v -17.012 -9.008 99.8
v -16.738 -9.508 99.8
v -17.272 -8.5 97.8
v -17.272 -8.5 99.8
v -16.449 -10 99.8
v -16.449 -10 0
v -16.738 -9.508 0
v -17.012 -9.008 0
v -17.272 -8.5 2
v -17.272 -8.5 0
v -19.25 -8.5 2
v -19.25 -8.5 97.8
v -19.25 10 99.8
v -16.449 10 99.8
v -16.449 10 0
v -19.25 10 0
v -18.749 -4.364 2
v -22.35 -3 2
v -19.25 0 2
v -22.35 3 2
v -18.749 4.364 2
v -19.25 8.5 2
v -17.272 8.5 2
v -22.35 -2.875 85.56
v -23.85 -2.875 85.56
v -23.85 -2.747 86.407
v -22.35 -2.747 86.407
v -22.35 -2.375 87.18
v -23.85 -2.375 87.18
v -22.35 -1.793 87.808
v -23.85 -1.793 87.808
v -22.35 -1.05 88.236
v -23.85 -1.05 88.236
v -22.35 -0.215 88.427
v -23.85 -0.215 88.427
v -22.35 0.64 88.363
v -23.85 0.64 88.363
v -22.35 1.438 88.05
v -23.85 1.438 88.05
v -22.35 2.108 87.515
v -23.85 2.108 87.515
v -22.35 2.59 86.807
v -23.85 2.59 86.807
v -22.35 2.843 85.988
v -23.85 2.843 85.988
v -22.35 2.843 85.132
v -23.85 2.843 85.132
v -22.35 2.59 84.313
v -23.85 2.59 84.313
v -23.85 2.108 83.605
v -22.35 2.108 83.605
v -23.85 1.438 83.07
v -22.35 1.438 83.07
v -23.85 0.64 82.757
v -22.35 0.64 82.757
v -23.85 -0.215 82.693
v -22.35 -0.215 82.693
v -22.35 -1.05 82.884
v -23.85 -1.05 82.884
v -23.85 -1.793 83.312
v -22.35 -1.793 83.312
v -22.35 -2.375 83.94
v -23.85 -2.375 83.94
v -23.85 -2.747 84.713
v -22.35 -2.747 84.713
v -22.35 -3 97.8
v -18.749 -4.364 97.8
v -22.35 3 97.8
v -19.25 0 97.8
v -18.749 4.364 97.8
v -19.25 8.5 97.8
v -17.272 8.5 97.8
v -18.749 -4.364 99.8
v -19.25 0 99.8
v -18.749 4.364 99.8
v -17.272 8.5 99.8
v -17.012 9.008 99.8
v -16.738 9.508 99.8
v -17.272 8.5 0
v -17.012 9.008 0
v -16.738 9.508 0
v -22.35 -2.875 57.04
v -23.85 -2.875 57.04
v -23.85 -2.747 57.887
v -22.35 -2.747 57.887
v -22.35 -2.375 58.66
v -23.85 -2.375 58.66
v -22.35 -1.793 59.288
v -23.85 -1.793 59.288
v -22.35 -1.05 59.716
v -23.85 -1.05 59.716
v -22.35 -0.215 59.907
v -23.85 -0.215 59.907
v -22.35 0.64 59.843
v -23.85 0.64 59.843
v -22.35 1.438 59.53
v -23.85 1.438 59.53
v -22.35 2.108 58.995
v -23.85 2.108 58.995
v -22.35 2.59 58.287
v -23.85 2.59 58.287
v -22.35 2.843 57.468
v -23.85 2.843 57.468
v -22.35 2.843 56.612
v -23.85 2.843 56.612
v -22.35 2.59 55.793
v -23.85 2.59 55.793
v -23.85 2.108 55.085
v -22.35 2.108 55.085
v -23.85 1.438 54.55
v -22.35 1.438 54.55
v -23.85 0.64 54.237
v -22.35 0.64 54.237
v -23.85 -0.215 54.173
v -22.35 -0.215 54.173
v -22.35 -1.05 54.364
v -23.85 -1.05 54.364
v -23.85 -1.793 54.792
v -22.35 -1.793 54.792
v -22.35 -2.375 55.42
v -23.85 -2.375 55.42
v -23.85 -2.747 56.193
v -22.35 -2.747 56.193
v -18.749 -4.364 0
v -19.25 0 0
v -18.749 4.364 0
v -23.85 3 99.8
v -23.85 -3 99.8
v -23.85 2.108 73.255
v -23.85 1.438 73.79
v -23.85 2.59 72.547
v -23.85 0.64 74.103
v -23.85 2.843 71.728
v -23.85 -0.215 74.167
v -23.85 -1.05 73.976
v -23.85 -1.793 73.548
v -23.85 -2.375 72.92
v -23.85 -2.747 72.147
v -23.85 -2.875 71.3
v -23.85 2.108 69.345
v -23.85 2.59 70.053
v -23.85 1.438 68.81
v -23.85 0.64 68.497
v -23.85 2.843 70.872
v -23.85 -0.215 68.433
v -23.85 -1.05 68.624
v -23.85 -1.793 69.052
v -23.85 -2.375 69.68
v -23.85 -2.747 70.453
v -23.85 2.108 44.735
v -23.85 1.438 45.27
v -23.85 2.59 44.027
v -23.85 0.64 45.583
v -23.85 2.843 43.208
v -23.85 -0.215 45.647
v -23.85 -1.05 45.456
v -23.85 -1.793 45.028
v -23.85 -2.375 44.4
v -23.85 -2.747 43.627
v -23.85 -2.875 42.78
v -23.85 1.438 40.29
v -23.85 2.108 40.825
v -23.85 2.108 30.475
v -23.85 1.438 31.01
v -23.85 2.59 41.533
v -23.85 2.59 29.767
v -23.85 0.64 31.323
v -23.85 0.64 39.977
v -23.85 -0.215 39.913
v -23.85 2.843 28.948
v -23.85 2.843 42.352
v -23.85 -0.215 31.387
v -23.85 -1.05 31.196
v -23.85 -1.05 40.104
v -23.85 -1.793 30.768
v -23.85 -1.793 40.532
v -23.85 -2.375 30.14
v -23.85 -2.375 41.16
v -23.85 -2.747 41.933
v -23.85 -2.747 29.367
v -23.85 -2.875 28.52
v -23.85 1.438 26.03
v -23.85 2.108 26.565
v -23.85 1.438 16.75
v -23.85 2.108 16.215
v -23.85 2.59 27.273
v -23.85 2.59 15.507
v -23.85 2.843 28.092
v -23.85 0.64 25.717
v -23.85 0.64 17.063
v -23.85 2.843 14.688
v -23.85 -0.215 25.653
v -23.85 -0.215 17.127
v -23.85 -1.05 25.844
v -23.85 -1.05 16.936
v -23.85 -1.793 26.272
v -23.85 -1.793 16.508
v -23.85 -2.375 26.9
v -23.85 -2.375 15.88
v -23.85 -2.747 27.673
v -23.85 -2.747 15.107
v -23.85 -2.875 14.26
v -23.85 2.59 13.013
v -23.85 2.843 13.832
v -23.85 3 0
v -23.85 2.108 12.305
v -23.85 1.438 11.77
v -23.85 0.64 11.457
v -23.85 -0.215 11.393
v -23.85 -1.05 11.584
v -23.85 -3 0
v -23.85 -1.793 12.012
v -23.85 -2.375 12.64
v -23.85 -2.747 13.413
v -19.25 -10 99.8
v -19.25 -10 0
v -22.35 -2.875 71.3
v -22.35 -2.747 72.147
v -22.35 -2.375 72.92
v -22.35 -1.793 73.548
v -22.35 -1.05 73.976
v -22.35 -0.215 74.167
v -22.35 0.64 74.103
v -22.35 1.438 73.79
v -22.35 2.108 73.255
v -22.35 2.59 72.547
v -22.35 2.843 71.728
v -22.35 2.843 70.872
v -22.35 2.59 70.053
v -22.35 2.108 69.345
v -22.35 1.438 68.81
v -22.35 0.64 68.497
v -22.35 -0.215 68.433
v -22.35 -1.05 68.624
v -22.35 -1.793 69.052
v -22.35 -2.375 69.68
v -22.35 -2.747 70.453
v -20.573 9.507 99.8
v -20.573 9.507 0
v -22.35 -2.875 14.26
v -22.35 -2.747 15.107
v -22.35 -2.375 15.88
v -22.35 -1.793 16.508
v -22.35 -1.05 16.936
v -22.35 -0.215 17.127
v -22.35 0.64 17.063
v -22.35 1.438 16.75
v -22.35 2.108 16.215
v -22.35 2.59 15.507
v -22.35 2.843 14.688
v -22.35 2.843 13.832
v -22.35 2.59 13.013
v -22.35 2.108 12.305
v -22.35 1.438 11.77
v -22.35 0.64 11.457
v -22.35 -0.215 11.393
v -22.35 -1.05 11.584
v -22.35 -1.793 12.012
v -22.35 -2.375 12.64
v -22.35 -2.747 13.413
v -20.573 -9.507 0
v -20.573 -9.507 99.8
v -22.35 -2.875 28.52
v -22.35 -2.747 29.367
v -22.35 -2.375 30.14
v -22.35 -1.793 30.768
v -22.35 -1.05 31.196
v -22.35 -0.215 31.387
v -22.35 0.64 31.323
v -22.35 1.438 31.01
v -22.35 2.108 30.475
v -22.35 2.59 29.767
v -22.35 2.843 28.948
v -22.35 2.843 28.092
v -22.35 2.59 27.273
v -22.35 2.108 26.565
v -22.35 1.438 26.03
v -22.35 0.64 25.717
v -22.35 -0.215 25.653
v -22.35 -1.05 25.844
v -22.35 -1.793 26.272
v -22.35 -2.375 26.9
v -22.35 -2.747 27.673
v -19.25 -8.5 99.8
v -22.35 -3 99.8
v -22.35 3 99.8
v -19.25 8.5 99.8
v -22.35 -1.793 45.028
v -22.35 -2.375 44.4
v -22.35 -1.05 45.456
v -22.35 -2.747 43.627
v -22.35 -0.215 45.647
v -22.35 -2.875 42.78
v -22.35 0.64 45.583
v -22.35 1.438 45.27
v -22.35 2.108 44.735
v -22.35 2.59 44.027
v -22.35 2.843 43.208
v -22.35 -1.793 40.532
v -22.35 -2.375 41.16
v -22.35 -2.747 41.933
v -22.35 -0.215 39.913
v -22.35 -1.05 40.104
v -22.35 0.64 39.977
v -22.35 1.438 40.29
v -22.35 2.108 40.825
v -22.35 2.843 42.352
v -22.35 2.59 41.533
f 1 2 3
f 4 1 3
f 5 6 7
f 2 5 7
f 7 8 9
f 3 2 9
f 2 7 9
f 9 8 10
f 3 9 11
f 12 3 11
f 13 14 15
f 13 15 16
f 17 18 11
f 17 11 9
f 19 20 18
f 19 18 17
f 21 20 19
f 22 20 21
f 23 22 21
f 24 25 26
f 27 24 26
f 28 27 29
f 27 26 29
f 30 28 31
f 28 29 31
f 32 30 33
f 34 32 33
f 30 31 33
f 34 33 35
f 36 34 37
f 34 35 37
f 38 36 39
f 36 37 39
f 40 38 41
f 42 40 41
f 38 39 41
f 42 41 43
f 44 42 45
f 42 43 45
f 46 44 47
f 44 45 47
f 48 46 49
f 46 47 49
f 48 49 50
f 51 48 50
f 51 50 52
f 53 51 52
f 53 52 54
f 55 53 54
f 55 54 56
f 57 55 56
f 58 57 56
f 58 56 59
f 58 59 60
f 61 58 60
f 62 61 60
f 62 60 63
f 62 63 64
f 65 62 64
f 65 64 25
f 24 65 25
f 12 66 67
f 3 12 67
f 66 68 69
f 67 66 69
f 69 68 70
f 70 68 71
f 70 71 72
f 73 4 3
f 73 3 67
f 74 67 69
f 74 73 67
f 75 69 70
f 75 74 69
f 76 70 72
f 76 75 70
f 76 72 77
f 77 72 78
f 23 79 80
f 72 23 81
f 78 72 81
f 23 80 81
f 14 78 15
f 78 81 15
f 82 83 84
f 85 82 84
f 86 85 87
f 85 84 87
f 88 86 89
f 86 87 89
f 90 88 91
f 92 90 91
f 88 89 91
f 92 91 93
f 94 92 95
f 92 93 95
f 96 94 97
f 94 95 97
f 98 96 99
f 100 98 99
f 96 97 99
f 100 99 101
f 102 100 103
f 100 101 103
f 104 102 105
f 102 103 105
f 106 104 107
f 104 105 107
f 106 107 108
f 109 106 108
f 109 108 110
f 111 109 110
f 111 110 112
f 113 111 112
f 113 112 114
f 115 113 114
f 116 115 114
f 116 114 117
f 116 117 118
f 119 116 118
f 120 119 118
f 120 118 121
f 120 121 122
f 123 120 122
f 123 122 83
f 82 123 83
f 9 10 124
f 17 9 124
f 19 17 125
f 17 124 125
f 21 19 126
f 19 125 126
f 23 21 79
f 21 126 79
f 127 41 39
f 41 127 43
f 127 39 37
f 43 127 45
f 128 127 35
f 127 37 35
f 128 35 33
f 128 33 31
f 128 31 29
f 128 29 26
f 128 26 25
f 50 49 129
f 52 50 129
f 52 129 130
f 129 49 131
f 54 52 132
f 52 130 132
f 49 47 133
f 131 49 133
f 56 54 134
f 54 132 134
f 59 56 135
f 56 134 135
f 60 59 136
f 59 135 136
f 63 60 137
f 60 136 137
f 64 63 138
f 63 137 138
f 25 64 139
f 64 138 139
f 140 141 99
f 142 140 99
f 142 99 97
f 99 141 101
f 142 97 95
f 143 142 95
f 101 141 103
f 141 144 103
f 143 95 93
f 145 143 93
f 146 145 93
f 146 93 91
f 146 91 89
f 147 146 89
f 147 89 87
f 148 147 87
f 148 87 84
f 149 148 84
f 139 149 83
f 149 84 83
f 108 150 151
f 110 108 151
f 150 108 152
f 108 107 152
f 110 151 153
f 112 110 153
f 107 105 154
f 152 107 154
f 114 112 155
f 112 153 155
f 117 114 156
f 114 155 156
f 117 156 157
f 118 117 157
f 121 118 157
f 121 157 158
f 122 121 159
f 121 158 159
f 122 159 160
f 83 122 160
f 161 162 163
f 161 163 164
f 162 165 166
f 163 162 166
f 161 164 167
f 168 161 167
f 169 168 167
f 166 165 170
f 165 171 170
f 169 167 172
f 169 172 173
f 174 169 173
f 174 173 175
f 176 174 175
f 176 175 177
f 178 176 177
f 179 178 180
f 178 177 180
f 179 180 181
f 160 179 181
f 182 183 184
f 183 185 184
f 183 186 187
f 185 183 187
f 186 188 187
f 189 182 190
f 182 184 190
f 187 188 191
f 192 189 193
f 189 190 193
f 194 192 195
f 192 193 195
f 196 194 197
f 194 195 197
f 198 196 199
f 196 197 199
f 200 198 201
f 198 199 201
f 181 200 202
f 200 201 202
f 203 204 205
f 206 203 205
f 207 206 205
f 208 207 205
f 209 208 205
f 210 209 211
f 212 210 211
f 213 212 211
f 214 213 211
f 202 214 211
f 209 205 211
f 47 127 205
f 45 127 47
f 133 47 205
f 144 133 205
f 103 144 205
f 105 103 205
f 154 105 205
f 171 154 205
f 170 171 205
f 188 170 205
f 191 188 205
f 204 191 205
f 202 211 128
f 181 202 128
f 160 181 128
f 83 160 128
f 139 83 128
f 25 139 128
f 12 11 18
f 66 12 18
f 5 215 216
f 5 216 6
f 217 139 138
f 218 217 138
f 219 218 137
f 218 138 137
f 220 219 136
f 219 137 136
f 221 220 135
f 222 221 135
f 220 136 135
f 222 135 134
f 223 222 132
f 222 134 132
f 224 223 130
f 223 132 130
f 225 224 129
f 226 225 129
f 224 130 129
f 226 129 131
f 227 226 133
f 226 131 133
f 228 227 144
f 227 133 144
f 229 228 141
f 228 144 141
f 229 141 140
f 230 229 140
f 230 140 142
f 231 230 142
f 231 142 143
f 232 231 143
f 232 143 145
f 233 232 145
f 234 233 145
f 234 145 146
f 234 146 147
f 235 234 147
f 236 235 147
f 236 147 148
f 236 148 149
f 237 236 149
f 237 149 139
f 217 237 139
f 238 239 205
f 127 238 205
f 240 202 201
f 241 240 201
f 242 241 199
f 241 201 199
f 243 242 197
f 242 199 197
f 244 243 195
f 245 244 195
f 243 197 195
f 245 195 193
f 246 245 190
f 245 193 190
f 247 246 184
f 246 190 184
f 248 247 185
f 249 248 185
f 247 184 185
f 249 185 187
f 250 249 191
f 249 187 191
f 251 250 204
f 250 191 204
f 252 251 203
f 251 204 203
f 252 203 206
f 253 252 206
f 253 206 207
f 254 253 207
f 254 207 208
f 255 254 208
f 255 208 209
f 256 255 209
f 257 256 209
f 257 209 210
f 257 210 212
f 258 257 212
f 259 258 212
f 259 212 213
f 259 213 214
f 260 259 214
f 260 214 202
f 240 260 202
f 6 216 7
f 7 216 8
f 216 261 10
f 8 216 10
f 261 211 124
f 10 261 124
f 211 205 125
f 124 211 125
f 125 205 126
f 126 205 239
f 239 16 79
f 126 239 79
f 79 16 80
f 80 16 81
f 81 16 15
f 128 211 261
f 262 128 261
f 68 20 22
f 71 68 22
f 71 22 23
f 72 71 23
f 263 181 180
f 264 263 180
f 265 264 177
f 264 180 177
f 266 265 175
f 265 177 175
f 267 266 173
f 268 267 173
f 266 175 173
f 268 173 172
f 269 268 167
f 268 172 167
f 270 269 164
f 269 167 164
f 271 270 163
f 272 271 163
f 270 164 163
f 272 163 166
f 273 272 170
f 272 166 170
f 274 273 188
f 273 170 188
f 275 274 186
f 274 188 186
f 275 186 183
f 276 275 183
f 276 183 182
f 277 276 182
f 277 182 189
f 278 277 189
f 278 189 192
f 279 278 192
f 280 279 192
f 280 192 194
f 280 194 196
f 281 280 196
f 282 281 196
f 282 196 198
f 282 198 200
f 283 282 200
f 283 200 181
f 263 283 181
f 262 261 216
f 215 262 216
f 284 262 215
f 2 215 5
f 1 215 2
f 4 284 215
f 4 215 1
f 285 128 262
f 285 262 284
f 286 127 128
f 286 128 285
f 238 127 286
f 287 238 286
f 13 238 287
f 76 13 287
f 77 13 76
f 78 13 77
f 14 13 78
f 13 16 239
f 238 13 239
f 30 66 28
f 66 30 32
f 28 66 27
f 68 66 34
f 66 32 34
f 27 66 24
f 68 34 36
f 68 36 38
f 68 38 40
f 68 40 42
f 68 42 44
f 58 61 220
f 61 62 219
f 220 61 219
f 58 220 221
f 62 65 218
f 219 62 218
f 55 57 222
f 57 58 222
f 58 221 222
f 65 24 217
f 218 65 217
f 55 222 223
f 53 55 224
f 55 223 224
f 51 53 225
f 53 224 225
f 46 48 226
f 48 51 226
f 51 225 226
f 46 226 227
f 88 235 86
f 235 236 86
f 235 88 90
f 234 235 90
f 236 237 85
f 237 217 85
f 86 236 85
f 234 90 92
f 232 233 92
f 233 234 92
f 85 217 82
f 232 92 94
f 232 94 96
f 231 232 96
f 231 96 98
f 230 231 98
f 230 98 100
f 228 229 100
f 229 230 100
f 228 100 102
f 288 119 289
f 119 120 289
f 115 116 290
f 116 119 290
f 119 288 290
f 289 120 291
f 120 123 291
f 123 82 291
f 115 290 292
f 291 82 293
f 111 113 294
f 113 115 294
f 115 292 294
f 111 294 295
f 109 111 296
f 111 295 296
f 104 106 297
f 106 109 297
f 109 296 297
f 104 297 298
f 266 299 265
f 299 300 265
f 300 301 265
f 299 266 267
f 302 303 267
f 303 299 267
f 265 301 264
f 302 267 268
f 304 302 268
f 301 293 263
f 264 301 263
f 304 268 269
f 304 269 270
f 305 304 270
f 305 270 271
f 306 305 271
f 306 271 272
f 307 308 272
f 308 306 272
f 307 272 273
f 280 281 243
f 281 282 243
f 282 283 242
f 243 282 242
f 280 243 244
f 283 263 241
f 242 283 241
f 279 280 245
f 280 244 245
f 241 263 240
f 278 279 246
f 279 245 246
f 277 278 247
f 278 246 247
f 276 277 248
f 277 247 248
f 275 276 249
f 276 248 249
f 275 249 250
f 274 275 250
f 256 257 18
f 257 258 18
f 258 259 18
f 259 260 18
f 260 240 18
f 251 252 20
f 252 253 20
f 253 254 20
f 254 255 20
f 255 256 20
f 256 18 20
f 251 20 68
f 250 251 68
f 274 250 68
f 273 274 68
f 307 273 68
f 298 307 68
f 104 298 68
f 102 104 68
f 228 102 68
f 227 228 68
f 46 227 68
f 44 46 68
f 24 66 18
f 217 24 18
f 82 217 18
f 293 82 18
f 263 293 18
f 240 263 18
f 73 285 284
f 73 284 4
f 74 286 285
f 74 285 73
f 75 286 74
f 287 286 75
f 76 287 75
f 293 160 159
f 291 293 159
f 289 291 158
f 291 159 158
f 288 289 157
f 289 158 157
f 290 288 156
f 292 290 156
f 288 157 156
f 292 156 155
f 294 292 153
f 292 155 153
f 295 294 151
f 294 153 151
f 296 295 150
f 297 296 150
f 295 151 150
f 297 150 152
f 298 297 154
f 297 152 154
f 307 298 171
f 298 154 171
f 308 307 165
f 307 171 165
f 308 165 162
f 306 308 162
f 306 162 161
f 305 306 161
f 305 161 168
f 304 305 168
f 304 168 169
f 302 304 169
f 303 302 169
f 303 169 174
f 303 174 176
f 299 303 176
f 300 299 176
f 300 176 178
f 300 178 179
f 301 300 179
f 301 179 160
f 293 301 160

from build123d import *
from build123d import SkipClean  # not in build123d's __all__

# Parameters (mm, degrees)
F1_DEPTH = 99.8
F2_R     = 2.875
F3_DEPTH = 4
F4_DEPTH = 2
F6_DEPTH = 2


with BuildPart() as f1:
    # F0 (on Top) → F1 (new body)
    with BuildSketch(Plane.XY):
        with BuildLine():
            ThreePointArc((-17.2717254494, 8.5), (-16.8769277982, 9.2591472661), (-16.4487841496, 10))
            Line((-16.4487841496, 10), (-19.25, 10))
            Line((-19.25, 10), (-20.572897503, 9.5070659068))
            Line((-20.572897503, 9.5070659068), (-23.85, 3))
            Line((-23.85, 3), (-23.85, -3))
            Line((-23.85, -3), (-20.572897503, -9.5070659068))
            Line((-20.572897503, -9.5070659068), (-19.25, -10))
            Line((-19.25, -10), (-16.4487841496, -10))
            ThreePointArc((-16.4487841496, -10), (-16.8769277982, -9.2591472661), (-17.2717254494, -8.5))
            Line((-17.2717254494, -8.5), (-19.25, -8.5))
            Line((-19.25, -8.5), (-22.35, -3))
            Line((-22.35, -3), (-22.35, 0))
            Line((-22.35, 0), (-22.35, 3))
            Line((-22.35, 3), (-19.25, 8.5))
            Line((-19.25, 8.5), (-17.2717254494, 8.5))
        make_face()
    extrude(amount=F1_DEPTH)

    # F2 (on face) → F3 (cut)
    with BuildSketch(Plane(origin=(-23.85, 0, 0), x_dir=(0, -1, 0), z_dir=(-1, 0, 0))):
        with Locations((0, 14.26)):
            Circle(F2_R)
        with Locations((0, 28.52)):
            Circle(F2_R)
        with Locations((0, 42.78)):
            Circle(F2_R)
        with Locations((0, 57.04)):
            Circle(F2_R)
        with Locations((0, 71.3)):
            Circle(F2_R)
        with Locations((0, 85.56)):
            Circle(F2_R)
    extrude(amount=-F3_DEPTH, mode=Mode.SUBTRACT)

    # F0 (on Top) → F4 (join)
    with BuildSketch(Plane.XY):
        with BuildLine():
            ThreePointArc((-17.2717254494, -8.5), (-19.25, 0), (-17.2717254494, 8.5))
            Line((-17.2717254494, 8.5), (-19.25, 8.5))
            Line((-19.25, 8.5), (-22.35, 3))
            Line((-22.35, 3), (-22.35, 0))
            Line((-22.35, 0), (-22.35, -3))
            Line((-22.35, -3), (-19.25, -8.5))
            Line((-19.25, -8.5), (-17.2717254494, -8.5))
        make_face()
    extrude(amount=F4_DEPTH)

    # F5 (on face) → F6 (join)
    with BuildSketch(Plane.XY.offset(99.8)):
        with BuildLine():
            ThreePointArc((-17.2717254494, -8.5), (-19.25, 0), (-17.2717254494, 8.5))
            Line((-17.2717254494, 8.5), (-19.25, 8.5))
            Line((-19.25, 8.5), (-22.35, 3))
            Line((-22.35, 3), (-22.35, -3))
            Line((-22.35, -3), (-19.25, -8.5))
            Line((-19.25, -8.5), (-17.2717254494, -8.5))
        make_face()
    with SkipClean():  # cleaning this boolean's faces spoils the solid; the shape is the same uncleaned
        extrude(amount=-F6_DEPTH)


solid = f1.part
